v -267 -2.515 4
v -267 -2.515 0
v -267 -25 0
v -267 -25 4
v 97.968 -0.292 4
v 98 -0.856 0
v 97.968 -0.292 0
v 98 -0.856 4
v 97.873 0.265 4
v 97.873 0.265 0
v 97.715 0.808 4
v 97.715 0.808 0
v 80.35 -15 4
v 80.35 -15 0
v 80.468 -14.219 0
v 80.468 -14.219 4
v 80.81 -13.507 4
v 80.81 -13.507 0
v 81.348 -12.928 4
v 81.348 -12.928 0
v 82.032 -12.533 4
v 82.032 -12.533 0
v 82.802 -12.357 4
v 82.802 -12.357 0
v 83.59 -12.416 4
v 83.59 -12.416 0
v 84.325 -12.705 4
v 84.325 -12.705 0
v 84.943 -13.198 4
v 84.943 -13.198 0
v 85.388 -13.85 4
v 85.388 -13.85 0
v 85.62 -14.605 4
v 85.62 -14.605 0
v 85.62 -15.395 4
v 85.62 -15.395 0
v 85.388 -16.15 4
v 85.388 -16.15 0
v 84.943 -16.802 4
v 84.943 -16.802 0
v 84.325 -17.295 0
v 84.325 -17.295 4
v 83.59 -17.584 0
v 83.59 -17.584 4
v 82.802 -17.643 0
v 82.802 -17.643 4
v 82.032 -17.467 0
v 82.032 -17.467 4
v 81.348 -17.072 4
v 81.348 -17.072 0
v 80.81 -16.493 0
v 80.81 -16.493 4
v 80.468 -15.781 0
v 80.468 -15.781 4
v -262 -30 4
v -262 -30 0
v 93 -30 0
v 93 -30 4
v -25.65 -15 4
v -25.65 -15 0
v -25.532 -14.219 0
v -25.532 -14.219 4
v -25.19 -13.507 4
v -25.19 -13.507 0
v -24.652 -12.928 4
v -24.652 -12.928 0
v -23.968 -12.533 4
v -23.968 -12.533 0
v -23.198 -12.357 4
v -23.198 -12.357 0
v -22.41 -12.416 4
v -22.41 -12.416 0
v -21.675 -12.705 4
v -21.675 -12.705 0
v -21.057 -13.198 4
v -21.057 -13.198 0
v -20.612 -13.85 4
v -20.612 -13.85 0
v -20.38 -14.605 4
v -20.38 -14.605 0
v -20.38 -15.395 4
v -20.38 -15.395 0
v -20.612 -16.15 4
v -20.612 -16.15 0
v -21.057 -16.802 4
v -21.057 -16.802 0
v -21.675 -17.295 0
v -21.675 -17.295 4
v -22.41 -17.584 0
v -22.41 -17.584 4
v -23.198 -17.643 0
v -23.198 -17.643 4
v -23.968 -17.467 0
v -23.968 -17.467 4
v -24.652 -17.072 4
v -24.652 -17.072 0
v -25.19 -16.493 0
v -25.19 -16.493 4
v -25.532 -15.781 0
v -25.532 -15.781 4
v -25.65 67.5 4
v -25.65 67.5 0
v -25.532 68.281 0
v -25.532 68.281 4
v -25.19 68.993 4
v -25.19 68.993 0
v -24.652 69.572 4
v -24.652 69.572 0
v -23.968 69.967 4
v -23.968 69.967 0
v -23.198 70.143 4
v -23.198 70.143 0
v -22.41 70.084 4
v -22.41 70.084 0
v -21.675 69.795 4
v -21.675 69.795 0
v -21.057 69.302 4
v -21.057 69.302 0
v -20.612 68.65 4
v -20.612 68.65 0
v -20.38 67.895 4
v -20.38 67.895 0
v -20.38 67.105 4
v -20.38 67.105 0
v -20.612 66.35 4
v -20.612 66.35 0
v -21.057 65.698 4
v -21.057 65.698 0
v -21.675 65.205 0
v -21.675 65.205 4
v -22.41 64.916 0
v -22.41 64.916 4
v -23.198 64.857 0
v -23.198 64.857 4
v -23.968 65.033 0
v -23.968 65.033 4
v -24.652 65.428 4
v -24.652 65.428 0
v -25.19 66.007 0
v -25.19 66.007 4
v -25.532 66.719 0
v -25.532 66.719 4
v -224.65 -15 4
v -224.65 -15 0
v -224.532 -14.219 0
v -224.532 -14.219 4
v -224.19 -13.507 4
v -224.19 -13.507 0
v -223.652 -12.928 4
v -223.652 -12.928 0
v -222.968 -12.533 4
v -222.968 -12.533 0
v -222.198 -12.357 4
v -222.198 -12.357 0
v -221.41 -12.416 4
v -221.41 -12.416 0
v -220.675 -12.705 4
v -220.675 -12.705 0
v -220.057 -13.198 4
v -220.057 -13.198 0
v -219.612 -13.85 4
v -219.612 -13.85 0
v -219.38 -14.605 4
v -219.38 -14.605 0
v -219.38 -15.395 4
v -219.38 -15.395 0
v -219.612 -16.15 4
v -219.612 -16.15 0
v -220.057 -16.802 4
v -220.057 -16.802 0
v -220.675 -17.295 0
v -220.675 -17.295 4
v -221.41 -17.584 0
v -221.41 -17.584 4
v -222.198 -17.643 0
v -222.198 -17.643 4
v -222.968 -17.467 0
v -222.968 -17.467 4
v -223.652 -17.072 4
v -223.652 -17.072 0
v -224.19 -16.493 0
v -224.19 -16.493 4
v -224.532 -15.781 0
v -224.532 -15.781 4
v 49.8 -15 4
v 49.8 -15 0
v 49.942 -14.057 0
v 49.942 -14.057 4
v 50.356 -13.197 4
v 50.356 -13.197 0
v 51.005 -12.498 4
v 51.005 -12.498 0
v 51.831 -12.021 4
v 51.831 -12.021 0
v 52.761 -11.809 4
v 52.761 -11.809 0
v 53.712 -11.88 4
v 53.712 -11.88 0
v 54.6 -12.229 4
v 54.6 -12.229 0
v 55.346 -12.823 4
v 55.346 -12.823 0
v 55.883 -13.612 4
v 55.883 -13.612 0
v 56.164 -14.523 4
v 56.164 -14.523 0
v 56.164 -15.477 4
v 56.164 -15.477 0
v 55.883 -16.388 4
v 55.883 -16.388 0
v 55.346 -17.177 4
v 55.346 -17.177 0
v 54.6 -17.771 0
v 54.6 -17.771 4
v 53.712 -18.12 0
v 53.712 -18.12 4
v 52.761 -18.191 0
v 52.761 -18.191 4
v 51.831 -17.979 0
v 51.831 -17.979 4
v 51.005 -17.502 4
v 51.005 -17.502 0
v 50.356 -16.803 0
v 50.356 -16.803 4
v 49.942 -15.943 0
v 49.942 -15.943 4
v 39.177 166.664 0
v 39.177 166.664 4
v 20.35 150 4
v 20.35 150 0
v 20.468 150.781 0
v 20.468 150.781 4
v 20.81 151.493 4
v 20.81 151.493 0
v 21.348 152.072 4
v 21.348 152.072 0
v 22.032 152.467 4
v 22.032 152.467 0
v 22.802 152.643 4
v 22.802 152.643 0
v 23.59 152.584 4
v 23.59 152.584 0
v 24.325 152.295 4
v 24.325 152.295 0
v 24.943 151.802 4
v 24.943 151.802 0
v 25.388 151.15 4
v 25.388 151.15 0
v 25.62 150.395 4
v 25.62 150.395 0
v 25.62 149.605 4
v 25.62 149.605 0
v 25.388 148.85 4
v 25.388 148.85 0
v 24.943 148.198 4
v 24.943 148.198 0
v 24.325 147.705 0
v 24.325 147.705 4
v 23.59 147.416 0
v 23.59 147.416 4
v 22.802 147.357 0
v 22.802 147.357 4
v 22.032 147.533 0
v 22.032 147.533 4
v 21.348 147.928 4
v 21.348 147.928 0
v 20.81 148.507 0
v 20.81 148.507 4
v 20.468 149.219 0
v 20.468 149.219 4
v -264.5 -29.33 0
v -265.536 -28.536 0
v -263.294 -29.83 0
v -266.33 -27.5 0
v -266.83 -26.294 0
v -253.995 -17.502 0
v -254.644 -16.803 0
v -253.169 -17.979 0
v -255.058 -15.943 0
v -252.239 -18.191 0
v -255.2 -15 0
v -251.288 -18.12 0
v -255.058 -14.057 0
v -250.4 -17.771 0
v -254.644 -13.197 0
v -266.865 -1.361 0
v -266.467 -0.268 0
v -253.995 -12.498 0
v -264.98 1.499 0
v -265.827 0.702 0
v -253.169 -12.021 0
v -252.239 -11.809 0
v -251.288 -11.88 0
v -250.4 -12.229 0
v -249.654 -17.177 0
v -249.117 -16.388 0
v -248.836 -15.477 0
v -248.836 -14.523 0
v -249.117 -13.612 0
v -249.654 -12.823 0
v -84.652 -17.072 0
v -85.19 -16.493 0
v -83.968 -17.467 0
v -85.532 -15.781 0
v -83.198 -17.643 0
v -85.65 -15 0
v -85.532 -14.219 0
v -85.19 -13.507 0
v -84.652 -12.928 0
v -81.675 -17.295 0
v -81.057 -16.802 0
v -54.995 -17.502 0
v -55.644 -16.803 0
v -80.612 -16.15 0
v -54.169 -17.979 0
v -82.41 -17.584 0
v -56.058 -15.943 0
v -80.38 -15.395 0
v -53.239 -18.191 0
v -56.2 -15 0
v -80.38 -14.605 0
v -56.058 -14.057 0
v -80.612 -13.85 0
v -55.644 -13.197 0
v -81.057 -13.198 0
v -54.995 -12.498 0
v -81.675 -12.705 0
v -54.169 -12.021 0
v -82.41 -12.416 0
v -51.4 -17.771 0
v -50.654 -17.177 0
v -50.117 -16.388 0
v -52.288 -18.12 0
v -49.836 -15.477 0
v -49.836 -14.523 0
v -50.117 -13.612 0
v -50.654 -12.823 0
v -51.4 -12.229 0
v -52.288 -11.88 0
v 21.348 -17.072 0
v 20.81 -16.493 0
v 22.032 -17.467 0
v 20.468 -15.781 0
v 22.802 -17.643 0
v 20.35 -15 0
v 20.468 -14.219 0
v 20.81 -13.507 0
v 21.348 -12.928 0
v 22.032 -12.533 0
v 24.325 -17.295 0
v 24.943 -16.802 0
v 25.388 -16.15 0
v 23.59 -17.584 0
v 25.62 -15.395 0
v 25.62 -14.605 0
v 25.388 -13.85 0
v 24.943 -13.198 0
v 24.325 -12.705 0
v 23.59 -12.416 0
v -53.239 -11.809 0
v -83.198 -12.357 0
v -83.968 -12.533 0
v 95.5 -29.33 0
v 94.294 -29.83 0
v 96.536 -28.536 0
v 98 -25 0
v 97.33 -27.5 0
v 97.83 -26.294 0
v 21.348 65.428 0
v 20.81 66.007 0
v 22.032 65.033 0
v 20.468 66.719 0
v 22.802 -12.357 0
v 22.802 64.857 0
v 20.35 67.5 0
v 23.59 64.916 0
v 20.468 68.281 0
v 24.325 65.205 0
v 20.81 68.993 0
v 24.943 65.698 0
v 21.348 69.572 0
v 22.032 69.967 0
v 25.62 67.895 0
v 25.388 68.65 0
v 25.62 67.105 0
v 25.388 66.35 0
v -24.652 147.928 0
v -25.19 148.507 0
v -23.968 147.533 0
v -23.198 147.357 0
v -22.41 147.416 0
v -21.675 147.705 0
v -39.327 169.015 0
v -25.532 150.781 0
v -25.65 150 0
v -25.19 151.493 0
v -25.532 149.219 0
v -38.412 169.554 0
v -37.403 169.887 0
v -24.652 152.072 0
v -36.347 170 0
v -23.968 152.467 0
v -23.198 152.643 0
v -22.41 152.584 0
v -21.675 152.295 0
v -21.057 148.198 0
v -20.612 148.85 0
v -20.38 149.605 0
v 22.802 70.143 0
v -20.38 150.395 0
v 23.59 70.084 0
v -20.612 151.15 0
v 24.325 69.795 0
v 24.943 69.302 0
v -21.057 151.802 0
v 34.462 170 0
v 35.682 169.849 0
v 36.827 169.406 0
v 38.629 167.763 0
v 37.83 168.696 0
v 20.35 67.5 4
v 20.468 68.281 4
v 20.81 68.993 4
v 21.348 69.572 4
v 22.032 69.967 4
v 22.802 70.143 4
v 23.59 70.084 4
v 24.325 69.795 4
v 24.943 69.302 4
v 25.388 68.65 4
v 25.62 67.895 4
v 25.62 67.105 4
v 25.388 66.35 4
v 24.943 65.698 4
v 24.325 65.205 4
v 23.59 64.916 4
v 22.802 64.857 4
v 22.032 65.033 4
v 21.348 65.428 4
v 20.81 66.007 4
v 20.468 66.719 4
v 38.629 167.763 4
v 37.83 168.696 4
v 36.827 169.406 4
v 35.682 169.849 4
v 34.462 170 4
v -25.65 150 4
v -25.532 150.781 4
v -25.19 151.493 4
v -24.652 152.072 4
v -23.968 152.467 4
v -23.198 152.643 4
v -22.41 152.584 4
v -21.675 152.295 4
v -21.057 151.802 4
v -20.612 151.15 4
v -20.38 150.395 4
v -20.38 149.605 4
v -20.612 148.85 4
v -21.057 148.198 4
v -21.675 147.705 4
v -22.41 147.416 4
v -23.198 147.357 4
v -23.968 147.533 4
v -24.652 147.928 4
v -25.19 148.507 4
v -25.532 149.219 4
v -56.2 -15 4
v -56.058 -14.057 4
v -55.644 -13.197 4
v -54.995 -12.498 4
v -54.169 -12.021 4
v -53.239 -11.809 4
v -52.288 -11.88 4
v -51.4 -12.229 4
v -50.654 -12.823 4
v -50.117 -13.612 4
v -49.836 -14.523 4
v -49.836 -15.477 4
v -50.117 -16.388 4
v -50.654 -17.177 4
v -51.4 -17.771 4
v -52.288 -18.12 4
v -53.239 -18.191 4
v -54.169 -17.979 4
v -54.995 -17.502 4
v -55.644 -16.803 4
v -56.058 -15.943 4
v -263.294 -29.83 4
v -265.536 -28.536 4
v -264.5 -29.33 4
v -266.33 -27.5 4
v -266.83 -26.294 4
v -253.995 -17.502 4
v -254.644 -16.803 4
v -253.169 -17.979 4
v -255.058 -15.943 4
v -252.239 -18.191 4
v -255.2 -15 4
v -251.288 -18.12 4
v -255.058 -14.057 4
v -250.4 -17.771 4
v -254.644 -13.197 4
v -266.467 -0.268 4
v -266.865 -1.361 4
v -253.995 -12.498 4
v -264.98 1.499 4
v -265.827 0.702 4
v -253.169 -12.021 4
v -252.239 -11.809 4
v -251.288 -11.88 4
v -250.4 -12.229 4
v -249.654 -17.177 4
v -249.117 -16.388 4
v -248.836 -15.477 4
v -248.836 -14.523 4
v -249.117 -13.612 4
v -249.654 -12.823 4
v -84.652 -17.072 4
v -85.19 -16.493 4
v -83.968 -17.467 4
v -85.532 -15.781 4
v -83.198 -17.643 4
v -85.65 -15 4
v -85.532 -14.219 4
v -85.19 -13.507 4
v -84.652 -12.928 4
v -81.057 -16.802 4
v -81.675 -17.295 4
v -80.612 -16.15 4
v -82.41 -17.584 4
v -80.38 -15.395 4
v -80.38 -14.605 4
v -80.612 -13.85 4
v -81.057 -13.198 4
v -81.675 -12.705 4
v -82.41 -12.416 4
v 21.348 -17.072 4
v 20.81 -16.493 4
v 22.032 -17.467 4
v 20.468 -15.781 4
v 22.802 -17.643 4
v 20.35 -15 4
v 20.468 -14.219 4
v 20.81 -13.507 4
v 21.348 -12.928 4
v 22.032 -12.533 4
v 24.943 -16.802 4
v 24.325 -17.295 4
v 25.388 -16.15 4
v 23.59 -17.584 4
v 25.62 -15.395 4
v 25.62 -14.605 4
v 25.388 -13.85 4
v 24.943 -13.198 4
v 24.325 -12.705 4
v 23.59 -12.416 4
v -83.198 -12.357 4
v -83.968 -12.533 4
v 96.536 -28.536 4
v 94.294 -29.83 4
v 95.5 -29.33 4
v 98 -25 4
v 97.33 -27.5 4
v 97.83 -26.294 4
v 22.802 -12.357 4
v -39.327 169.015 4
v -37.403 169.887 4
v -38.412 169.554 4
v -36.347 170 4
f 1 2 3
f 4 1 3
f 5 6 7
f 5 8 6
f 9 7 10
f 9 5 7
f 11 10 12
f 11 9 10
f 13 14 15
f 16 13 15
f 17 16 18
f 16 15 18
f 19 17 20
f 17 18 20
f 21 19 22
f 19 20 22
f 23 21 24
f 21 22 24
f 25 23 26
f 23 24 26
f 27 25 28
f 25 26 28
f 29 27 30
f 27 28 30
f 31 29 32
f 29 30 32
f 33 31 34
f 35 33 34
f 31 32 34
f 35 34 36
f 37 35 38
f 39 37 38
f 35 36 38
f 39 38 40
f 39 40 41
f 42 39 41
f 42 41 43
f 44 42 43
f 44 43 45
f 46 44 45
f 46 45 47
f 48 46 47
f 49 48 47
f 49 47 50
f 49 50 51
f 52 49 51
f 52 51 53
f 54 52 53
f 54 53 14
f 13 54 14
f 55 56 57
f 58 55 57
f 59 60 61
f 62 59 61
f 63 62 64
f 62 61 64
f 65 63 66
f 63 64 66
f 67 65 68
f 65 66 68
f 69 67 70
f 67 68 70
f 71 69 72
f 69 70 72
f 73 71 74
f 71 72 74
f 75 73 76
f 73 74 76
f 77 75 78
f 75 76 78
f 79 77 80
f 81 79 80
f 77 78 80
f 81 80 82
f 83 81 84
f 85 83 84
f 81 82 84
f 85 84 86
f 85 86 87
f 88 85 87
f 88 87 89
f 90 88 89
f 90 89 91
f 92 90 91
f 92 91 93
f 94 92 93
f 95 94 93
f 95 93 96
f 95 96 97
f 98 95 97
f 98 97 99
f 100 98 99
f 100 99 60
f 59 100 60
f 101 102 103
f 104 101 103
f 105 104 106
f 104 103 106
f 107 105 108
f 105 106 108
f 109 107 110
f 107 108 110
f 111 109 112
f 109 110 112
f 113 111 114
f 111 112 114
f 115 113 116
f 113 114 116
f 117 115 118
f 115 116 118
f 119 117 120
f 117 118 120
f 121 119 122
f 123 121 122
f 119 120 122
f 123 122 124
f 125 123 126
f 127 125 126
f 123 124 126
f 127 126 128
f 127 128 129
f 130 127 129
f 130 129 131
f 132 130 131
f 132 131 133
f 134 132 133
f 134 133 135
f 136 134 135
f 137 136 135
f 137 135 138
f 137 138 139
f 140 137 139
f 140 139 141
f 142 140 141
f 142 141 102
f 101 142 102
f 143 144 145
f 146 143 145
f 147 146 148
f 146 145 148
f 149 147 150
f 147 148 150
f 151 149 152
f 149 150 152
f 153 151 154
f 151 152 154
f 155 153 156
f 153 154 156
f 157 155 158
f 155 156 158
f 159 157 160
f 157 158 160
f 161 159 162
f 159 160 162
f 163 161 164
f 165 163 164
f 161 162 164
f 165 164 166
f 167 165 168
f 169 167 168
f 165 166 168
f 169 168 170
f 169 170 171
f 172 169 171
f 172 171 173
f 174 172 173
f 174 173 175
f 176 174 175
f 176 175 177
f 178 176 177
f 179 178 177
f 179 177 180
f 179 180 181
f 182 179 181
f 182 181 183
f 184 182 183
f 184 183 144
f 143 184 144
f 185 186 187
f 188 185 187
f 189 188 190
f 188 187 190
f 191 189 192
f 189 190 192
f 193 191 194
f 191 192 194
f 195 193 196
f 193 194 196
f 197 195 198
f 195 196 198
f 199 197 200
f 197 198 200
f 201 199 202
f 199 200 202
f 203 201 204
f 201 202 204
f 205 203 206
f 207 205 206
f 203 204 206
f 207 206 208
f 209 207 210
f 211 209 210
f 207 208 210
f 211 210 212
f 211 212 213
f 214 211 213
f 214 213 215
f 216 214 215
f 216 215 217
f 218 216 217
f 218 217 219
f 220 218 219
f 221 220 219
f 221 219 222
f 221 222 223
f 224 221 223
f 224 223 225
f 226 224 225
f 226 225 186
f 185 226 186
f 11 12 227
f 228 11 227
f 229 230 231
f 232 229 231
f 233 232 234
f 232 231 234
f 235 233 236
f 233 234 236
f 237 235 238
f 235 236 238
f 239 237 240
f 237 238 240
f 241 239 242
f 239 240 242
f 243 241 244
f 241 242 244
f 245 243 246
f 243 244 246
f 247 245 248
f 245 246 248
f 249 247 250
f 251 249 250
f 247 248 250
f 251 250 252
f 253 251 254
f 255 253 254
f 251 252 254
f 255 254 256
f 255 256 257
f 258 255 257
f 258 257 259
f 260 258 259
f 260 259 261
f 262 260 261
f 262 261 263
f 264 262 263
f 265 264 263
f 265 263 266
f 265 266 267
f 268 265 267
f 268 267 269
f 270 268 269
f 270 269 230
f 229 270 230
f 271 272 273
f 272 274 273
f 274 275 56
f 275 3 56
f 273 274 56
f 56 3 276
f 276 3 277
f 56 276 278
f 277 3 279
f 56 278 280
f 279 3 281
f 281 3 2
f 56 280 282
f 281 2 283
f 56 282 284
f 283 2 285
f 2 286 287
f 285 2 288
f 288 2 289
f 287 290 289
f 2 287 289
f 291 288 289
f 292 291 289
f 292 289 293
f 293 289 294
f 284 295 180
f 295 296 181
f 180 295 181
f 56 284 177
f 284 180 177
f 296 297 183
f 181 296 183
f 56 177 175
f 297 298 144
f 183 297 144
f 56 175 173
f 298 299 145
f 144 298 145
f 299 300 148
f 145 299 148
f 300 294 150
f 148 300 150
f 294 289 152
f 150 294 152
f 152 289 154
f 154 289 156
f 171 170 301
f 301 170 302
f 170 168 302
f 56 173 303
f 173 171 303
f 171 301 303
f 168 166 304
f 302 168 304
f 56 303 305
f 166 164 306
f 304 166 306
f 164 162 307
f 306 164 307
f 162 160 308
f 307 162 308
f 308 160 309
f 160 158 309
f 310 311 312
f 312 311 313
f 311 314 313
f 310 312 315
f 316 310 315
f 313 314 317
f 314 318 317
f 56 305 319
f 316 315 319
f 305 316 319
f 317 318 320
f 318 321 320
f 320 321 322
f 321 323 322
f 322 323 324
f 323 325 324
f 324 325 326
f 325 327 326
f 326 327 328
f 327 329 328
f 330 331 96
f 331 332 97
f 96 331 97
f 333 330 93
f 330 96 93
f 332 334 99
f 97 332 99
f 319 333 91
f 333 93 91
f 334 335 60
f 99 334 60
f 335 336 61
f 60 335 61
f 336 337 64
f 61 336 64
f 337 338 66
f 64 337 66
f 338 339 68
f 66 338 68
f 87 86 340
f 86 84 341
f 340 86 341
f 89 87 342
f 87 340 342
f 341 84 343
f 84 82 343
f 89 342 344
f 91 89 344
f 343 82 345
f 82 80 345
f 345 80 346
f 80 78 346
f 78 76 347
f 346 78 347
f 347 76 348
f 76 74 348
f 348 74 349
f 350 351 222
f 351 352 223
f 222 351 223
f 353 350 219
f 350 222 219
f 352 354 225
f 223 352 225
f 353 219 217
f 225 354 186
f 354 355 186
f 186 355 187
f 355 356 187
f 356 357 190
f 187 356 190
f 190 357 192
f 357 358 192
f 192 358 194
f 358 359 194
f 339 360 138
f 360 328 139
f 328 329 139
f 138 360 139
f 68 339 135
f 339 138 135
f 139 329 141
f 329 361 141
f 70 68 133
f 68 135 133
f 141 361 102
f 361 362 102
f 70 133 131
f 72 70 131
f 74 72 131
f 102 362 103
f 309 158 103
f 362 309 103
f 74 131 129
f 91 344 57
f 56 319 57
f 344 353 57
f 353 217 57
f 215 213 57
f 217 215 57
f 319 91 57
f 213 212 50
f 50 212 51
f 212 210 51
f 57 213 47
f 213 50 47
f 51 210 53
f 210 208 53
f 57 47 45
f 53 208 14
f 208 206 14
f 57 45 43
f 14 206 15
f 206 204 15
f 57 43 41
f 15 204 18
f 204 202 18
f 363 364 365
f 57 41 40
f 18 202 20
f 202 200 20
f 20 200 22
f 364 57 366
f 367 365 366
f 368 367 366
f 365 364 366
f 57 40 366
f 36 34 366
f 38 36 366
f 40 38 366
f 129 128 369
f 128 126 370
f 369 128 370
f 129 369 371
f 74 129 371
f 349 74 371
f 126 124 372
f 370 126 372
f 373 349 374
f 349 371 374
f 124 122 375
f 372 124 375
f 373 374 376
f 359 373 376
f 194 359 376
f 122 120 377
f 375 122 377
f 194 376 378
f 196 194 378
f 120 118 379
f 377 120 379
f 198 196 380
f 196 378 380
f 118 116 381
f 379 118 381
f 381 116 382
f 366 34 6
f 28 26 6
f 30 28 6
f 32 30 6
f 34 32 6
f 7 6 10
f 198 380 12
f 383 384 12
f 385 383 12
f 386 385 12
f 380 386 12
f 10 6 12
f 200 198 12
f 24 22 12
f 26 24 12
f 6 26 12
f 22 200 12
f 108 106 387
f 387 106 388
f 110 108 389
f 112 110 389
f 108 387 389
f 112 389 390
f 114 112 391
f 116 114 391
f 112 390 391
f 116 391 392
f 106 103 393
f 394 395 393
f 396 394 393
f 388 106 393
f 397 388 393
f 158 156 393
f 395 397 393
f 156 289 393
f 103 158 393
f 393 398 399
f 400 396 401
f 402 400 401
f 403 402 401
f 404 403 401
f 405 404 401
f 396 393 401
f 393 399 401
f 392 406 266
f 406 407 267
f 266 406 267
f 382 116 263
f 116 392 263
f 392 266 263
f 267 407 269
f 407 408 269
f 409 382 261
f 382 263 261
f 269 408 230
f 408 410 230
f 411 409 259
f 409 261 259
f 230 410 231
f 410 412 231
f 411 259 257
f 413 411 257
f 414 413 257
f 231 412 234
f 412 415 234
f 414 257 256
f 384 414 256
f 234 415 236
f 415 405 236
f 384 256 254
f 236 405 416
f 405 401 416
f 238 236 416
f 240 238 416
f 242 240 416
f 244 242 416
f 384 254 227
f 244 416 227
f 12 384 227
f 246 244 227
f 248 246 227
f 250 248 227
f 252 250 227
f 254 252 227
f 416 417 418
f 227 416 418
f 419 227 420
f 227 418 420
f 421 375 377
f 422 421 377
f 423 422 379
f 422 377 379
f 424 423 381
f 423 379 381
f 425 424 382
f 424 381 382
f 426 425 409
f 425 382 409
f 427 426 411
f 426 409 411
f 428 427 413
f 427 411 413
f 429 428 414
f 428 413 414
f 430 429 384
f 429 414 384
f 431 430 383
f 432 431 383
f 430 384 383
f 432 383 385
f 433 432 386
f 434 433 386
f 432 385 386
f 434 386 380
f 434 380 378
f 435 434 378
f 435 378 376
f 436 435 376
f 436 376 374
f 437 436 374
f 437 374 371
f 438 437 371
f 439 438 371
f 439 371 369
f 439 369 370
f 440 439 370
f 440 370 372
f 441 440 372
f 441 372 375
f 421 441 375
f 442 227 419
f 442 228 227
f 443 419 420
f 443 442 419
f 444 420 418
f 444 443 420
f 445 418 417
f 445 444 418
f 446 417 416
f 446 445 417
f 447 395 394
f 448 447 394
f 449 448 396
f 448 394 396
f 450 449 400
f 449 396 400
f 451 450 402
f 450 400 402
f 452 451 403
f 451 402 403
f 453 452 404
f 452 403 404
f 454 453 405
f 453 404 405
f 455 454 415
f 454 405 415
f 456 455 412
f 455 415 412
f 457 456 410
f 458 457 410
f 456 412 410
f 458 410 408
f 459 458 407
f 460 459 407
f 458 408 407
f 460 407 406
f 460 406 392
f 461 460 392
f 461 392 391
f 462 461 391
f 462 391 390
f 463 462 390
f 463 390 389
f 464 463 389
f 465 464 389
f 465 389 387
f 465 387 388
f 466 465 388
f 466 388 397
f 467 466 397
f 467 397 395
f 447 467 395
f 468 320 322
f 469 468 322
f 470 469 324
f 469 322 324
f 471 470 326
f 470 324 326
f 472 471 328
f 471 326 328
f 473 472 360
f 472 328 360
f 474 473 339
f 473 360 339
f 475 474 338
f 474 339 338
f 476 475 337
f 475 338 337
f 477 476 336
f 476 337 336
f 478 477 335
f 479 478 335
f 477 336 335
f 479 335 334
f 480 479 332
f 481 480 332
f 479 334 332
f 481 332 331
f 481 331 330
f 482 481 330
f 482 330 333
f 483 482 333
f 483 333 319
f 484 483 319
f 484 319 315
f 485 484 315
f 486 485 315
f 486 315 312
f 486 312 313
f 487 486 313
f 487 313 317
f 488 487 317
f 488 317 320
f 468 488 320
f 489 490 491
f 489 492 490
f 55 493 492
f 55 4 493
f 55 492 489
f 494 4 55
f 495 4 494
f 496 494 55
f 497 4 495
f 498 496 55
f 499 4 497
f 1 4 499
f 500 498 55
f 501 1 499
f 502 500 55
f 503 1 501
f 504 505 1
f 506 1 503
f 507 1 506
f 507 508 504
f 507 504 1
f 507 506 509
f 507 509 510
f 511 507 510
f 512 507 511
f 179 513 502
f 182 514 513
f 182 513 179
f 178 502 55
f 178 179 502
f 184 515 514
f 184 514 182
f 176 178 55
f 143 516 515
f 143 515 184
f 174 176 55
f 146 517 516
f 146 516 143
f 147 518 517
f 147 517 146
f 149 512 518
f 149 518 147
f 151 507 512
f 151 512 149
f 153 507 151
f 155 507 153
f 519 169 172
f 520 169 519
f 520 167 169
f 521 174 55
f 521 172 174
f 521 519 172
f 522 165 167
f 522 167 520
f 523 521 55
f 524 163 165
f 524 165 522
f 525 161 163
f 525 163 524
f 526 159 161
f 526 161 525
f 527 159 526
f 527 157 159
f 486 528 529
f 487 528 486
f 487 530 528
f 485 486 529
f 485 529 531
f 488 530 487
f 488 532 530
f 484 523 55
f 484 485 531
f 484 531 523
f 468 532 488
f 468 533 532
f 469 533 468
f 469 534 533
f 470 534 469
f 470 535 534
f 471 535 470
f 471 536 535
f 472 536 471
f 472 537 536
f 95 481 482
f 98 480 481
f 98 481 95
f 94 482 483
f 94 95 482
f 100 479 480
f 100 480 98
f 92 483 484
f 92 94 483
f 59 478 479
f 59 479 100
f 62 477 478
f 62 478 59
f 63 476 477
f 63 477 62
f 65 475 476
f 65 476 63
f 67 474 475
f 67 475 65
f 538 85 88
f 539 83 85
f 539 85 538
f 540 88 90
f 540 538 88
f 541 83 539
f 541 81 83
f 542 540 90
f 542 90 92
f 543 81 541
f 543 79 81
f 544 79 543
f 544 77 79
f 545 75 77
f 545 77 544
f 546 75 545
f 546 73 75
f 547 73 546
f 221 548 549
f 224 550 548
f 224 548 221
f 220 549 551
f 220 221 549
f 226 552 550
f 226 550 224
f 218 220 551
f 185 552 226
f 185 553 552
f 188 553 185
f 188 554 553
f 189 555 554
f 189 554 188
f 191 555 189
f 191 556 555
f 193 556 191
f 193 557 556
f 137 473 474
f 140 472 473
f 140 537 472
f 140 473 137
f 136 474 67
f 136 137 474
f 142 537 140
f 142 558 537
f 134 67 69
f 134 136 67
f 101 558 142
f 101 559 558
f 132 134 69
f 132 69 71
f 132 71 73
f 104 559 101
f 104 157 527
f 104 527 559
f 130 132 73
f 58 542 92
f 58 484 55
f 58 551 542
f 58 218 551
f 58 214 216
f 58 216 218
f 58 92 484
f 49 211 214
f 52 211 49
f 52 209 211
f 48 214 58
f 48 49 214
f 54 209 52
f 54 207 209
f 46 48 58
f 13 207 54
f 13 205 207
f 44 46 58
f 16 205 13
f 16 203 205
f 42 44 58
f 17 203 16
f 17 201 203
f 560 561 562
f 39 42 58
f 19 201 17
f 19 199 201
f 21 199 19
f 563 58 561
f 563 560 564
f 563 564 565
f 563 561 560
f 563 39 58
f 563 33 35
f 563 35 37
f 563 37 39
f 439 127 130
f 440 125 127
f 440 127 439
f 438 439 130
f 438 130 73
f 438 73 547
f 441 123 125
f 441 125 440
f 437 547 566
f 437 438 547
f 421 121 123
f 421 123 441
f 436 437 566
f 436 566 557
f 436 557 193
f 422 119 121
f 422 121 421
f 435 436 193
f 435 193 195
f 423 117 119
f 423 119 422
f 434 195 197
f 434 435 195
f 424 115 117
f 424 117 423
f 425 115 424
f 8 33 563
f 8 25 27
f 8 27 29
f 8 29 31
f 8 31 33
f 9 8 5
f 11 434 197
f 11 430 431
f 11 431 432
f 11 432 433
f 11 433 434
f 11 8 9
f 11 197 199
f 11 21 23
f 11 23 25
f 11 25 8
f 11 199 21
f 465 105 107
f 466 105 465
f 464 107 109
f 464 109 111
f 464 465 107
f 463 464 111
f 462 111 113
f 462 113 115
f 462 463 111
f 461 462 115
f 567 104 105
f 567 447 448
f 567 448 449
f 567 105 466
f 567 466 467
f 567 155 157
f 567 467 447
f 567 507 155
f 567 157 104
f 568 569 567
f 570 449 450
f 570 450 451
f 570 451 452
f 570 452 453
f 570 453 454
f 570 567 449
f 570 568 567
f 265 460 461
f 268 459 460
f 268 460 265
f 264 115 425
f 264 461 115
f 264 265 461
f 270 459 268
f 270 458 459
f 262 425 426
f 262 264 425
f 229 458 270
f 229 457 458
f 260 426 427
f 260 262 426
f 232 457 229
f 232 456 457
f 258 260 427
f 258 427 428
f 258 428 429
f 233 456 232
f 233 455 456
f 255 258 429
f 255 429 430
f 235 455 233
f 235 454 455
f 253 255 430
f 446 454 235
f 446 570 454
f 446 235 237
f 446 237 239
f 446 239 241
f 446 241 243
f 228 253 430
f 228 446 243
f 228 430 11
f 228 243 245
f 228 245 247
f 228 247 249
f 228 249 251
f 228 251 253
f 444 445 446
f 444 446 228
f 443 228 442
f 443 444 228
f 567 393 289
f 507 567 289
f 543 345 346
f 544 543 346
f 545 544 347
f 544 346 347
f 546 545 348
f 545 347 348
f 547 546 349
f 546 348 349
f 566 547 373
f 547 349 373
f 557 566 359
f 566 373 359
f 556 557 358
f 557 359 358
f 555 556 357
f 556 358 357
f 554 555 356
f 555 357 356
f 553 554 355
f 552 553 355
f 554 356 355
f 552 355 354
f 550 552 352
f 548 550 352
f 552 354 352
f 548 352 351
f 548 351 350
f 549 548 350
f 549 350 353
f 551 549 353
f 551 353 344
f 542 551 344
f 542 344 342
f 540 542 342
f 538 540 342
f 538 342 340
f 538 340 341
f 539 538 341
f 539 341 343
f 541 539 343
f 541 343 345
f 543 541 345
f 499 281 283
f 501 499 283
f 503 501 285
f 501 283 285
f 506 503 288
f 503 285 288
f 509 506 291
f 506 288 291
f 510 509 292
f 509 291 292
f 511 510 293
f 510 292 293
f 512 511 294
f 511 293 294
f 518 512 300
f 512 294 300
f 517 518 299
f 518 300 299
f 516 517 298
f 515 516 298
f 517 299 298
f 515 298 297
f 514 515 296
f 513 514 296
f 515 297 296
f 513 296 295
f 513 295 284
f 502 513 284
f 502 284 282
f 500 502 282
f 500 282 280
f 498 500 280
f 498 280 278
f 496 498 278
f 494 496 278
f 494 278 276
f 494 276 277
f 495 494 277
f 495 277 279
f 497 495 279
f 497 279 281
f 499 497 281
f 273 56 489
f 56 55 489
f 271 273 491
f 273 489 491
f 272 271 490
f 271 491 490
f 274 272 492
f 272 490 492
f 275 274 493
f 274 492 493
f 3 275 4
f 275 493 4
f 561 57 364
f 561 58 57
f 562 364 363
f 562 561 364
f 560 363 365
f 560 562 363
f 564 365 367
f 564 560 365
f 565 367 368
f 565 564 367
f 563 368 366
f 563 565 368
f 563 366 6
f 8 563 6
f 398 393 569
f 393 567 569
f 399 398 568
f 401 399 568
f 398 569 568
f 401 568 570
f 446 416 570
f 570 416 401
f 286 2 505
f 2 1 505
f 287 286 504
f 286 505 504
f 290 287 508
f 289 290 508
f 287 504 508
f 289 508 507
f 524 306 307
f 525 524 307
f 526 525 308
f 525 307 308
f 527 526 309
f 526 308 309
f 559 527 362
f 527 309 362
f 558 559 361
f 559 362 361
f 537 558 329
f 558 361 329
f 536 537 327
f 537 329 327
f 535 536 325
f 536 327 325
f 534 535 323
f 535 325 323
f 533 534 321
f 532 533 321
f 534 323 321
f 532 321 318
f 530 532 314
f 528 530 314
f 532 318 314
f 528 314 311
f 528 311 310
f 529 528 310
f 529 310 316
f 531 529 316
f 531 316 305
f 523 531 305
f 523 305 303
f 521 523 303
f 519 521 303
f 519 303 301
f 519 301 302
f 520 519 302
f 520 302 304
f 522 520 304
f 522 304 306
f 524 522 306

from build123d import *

# Parameters (mm, degrees)
BOSS_EXTRUDE1_DEPTH      = 4
M5_CLEARANCE_HOLE1_D     = 5.3
FILLET1_R                = 5
M6_CLEARANCE_HOLE1_D     = 6.4
M6_CLEARANCE_HOLE1_DEPTH = 8
M6_CLEARANCE_HOLE1_TIP   = 1.922753981


with BuildPart() as part:
    # Sketch1 → Boss-Extrude1 (new body)
    with BuildSketch(Plane.XY):
        Polygon((-267, -30), (98, -30), (98, 0), (38, 170), (-38, 170), (-267, 0), align=None)
    extrude(amount=BOSS_EXTRUDE1_DEPTH)

    # M5 Clearance Hole1 (through all)
    with Locations(Plane.XY.offset(4)):
        with Locations((-23, 150), (-23, 67.5), (-23, -15), (23, -15), (23, 150), (23, 67.5), (-83, -15), (83, -15), (-222, -15)):
            Hole(M5_CLEARANCE_HOLE1_D / 2)

    # Fillet1
    fillet1_edges = [part.edges().sort_by_distance(p)[0] for p in [
        (-267, 0, 2),
        (-38, 170, 2),
        (38, 170, 2),
        (98, 0, 2),
        (98, -30, 2),
        (-267, -30, 2),
    ]]
    fillet(fillet1_edges, radius=FILLET1_R)

    # M6 Clearance Hole1
    with Locations(Plane.XY.offset(4)):
        with Locations((-252, -15), (-53, -15), (53, -15)):
            Hole(M6_CLEARANCE_HOLE1_D / 2, depth=M6_CLEARANCE_HOLE1_DEPTH)
            with Locations((0, 0, -(M6_CLEARANCE_HOLE1_DEPTH + M6_CLEARANCE_HOLE1_TIP / 2))):  # 118° drill point
                Cone(0, M6_CLEARANCE_HOLE1_D / 2, M6_CLEARANCE_HOLE1_TIP, mode=Mode.SUBTRACT)


solid = part.part
